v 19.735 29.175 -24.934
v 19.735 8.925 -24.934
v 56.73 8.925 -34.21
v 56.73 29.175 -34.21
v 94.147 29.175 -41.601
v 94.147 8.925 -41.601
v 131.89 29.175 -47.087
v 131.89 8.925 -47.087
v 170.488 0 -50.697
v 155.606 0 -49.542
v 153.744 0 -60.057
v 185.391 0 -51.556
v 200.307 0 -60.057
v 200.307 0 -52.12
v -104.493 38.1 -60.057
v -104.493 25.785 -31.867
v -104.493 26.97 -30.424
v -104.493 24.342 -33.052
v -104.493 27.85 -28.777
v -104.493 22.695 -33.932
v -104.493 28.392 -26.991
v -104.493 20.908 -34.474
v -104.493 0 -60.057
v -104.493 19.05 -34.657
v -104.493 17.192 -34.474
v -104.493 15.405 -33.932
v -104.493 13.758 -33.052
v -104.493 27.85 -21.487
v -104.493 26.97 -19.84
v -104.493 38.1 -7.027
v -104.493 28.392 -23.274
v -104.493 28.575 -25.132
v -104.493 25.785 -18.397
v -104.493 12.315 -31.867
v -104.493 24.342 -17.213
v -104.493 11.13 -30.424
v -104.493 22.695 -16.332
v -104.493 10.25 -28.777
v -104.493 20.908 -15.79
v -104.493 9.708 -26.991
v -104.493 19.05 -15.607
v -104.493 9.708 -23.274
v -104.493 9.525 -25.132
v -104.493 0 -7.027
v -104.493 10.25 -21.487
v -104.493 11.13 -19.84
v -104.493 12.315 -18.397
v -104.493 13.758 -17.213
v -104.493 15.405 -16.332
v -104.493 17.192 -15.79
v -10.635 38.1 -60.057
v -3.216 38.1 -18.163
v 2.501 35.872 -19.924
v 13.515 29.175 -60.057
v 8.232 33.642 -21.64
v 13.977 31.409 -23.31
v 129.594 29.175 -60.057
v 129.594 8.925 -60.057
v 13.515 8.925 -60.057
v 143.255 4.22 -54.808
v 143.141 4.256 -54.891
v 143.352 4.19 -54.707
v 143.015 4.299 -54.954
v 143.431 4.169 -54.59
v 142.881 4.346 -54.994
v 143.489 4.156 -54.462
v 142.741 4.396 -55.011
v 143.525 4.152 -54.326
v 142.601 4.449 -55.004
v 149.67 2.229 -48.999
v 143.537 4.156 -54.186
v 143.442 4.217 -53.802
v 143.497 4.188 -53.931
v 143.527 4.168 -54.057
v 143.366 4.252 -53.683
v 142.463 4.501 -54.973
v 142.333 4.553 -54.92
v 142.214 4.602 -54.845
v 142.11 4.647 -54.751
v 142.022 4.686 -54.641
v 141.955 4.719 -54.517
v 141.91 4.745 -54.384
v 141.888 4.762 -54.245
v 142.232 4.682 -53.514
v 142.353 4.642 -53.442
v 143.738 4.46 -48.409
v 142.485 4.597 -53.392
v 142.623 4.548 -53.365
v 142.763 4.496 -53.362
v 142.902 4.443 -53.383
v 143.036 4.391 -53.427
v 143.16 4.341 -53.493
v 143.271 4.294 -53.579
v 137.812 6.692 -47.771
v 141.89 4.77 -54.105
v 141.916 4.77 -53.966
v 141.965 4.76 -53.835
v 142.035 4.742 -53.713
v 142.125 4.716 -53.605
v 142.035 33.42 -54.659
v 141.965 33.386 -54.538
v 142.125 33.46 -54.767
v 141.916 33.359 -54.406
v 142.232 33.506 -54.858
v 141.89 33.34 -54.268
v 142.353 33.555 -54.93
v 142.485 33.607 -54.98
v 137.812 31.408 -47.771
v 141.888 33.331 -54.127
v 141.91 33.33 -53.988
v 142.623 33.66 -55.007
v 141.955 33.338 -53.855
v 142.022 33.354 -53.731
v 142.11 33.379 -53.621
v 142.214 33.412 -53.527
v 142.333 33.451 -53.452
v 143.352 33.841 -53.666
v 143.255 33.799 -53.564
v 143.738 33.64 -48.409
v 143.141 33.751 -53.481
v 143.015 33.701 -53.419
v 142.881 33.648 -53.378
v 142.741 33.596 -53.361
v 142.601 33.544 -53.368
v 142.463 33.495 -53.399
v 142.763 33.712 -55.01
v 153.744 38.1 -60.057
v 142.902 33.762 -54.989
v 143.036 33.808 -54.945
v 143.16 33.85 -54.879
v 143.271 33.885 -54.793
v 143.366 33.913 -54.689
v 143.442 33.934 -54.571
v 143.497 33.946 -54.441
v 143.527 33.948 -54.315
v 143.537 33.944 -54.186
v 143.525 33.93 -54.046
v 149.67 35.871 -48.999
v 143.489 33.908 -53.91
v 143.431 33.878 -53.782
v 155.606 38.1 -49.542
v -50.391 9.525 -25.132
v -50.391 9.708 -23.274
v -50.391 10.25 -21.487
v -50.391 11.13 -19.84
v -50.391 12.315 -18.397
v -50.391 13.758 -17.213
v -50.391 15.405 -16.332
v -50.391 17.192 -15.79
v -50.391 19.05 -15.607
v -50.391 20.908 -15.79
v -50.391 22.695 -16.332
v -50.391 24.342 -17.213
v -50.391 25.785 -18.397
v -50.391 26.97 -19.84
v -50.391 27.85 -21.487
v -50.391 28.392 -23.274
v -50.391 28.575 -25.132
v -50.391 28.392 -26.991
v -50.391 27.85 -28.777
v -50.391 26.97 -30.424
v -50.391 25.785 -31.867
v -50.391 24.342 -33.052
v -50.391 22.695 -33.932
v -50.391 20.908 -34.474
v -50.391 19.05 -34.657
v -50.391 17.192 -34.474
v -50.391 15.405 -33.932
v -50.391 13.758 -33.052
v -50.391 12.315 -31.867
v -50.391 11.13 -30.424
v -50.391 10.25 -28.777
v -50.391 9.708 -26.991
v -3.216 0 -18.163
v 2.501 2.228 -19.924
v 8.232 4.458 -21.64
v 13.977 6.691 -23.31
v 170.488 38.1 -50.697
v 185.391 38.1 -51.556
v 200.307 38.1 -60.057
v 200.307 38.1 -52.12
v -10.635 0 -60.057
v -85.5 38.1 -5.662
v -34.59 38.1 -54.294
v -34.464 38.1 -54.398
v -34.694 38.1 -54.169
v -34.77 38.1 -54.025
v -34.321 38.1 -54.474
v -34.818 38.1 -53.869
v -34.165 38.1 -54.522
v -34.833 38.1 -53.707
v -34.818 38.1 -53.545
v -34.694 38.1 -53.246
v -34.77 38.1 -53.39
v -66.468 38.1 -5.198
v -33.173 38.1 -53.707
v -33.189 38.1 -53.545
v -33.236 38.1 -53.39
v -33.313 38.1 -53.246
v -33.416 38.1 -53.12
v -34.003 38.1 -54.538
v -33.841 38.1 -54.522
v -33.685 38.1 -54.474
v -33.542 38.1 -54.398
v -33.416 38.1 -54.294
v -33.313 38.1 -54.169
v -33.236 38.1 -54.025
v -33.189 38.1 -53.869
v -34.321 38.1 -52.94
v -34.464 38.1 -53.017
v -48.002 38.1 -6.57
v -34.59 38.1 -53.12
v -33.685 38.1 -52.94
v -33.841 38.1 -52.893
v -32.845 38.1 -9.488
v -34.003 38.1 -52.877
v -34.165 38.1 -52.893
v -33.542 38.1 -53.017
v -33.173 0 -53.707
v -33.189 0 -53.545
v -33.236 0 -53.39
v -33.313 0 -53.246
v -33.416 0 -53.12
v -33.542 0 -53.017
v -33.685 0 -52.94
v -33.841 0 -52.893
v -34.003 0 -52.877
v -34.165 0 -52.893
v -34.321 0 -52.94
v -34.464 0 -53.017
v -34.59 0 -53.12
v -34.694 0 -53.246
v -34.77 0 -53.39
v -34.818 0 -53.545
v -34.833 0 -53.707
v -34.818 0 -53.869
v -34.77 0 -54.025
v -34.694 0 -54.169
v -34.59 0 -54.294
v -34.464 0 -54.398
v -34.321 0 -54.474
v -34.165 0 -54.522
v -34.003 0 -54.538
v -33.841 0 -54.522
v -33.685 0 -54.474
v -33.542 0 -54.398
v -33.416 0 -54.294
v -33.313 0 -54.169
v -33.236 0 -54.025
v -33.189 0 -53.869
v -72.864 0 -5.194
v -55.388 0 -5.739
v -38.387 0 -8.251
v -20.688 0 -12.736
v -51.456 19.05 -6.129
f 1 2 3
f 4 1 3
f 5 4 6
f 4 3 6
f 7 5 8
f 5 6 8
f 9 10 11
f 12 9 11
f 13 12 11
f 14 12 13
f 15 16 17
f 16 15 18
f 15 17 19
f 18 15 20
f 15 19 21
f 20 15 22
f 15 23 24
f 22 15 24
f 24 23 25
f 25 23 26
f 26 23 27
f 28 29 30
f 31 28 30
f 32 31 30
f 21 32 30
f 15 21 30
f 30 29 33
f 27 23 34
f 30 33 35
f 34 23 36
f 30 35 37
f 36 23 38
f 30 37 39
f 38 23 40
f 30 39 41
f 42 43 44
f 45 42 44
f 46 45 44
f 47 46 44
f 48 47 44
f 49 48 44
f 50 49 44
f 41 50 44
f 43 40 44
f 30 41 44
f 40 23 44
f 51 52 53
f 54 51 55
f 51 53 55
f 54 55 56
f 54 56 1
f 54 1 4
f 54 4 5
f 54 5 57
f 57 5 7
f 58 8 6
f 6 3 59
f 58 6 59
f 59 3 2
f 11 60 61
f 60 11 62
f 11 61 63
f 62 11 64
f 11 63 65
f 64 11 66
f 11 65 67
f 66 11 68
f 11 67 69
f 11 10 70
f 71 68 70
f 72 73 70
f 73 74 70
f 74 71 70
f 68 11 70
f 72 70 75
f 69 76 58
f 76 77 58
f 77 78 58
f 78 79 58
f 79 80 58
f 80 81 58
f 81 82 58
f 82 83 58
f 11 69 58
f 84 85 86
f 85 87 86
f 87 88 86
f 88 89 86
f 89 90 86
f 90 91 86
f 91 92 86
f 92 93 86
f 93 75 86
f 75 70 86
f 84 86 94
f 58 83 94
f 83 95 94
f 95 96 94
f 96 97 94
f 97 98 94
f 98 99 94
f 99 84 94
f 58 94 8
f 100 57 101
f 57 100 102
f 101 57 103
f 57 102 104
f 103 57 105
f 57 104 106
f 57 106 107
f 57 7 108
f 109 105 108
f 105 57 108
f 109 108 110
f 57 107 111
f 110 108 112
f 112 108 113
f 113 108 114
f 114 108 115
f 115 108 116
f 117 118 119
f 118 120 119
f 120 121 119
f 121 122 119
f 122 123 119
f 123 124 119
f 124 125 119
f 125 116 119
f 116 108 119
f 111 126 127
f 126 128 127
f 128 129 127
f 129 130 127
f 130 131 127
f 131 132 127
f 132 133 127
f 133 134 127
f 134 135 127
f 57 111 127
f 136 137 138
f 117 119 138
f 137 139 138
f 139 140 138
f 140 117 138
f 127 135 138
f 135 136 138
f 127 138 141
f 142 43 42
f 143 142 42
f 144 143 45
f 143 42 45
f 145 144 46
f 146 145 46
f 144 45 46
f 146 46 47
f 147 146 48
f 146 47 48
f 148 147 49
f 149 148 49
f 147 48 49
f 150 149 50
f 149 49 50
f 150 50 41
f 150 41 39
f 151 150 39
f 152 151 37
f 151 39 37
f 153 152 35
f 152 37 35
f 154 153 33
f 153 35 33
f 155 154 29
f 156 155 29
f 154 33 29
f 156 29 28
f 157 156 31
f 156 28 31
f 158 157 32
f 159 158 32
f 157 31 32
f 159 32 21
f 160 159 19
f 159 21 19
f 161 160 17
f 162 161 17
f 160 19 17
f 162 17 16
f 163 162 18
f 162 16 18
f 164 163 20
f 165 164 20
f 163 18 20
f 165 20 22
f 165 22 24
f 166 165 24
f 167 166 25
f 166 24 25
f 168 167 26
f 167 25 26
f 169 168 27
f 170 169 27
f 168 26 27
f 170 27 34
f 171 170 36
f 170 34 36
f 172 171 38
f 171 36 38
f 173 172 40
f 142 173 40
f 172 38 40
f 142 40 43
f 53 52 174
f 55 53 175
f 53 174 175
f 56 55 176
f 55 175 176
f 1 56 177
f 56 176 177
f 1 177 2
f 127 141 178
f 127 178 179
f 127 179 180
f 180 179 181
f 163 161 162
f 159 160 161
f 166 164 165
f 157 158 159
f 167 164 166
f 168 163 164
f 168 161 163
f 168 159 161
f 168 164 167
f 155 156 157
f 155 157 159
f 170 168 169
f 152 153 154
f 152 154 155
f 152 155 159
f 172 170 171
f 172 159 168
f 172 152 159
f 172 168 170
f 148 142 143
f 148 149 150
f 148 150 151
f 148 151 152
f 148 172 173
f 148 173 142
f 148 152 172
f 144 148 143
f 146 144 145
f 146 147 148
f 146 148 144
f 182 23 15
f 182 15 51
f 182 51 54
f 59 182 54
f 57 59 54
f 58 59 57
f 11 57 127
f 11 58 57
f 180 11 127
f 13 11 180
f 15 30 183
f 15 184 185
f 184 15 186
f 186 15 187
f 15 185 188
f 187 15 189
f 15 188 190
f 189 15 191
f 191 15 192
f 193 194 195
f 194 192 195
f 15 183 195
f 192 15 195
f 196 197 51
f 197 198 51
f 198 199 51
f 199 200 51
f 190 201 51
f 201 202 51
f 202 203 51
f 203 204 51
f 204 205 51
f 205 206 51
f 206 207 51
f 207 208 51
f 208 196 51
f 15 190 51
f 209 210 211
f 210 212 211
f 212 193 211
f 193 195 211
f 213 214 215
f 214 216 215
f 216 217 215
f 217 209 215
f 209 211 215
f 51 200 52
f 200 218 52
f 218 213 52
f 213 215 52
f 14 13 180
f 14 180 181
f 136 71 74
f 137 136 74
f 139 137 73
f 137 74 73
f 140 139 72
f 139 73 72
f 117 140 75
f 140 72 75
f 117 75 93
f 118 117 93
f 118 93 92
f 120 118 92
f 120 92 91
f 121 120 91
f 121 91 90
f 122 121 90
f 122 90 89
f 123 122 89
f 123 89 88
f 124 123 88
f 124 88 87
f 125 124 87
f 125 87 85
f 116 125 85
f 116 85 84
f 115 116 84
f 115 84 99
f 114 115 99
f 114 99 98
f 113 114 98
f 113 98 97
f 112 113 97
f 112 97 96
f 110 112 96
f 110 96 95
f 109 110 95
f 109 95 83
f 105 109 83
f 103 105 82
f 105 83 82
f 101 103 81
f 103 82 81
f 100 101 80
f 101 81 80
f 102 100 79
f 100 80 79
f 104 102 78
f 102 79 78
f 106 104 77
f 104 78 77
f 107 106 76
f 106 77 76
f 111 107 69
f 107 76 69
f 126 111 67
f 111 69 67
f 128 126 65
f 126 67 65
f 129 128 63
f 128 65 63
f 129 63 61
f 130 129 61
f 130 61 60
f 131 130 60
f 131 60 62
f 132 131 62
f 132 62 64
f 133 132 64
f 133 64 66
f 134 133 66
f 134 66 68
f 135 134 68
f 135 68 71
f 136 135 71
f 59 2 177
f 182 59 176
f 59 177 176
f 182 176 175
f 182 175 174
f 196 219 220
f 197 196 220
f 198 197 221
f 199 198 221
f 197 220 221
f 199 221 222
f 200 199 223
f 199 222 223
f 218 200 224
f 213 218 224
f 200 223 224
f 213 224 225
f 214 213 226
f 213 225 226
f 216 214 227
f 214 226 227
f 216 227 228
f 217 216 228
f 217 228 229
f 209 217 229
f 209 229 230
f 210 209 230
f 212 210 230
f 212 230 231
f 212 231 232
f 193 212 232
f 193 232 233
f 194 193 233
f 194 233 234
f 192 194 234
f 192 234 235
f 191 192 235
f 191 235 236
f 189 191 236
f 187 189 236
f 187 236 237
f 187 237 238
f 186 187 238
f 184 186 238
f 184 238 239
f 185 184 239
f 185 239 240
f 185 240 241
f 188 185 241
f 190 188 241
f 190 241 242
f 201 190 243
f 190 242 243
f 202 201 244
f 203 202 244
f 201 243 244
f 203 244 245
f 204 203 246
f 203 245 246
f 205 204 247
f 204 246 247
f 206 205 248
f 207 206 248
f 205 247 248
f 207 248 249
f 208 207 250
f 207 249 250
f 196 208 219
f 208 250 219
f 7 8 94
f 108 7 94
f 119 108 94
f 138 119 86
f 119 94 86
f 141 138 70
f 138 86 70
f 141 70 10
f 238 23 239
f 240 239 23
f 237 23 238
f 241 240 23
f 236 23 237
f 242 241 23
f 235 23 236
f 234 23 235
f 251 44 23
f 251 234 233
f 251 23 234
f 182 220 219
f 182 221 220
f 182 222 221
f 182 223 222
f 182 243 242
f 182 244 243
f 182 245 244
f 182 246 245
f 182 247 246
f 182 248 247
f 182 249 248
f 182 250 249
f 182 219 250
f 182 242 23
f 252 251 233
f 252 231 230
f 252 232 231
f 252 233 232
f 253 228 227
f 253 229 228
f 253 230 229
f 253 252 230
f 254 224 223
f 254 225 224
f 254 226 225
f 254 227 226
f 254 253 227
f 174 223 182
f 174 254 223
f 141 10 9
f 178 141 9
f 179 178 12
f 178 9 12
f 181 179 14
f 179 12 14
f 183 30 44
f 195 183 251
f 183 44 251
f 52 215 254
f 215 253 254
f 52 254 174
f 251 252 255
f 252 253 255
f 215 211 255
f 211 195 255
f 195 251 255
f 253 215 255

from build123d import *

# Parameters (mm, degrees)
F0_W      = 304.8
F0_H      = 69.85
F1_DEPTH  = 38.1
F3_DEPTH  = 50.8
F4_R      = 9.525
F5_DEPTH  = 54.102
F7_DEPTH  = 127
F10_DEPTH = 76.2
F11_R     = 0.8255
F12_DEPTH = 76.2
F13_R     = 0.8303429156
F14_DEPTH = 76.2


with BuildPart() as f1:
    # F0 (on Front) → F1 (new body)
    with BuildSketch(Plane.XZ):
        with Locations((47.9073338211, -25.1322889625)):
            Rectangle(F0_W, F0_H)
    extrude(amount=-F1_DEPTH)

    # F2 (on face) → F3 (cut)
    with BuildSketch(Plane.XZ):
        Polygon((200.3073338211, 9.7927110375), (-104.4926661789, 9.7927110375), (200.3073338211, -44.1822889625), align=None)
    extrude(amount=-F3_DEPTH, mode=Mode.SUBTRACT)

    # F4 (on face) → F5 (cut)
    with BuildSketch(Plane(origin=(-104.4926661789, 0, 0), x_dir=(0, -1, 0), z_dir=(-1, 0, 0))):
        with Locations((-19.05, -25.1322889625)):
            Circle(F4_R)
    extrude(amount=-F5_DEPTH, mode=Mode.SUBTRACT)

    # F6 (on face) → F7 (cut)
    with BuildSketch(Plane(origin=(-1.4957050092, 0, -8.4463341696), x_dir=(0.9846801257, 0, -0.1743704389), z_dir=(0.1743704389, 0, 0.9846801257))):
        Polygon((161.8607493793, 38.1), (0, 38.1), (23.7803746896, 29.1751033832), (138.0803746896, 29.1751033832), align=None)
        Polygon((23.7803746896, 8.9248966168), (0, 0), (161.8607493793, 0), (138.0803746896, 8.9248966168), align=None)
    extrude(amount=-F7_DEPTH, mode=Mode.SUBTRACT)

    # F8 (on face) + F9 (on Front) → F10 (cut)
    with BuildSketch(Plane.XZ):
        with BuildLine():
            Line((-104.4926661789, 9.7927110375), (-104.4926661789, -7.0267124102))
            add(Edge.make_bspline(
                [(-104.4926661789, -7.0267124102), (-86.5421169112, -5.598796544), (-51.2128417473, -2.7884517576), (-19.0416161066, -13.0937231046), (-3.2163576046, -18.1629605909)],
                knots=[0, 0, 0, 0, 0.5080927696, 1, 1, 1, 1], degree=3))
            Line((-3.2163576046, -18.1629605909), (-1.4957050092, -8.4463341696))
            Line((-1.4957050092, -8.4463341696), (-104.4926661789, 9.7927110375))
        make_face()
    with BuildSketch(Plane.XZ):
        with BuildLine():
            ThreePointArc((-3.2163576046, -18.1629605909), (8.2323547856, -21.6399019905), (19.734878598, -24.9344555011))
            Line((19.734878598, -24.9344555011), (21.9203573303, -12.5929285423))
            Line((21.9203573303, -12.5929285423), (-1.4957050092, -8.4463341696))
            Line((-1.4957050092, -8.4463341696), (-3.2163576046, -18.1629605909))
        make_face()
        with BuildLine():
            Line((157.8853580419, -36.6700640849), (155.6058786995, -49.5424180184))
            ThreePointArc((155.6058786995, -49.5424180184), (177.93744088, -51.1635043768), (200.3073338211, -52.1197889625))
            Line((200.3073338211, -52.1197889625), (200.3073338211, -44.1822889625))
            Line((200.3073338211, -44.1822889625), (157.8853580419, -36.6700640849))
        make_face()
        with BuildLine():
            Line((134.4692957023, -32.5234697123), (131.8903467665, -47.086946056))
            ThreePointArc((131.8903467665, -47.086946056), (143.7383916941, -48.4085701416), (155.6058786995, -49.5424180184))
            Line((155.6058786995, -49.5424180184), (157.8853580419, -36.6700640849))
            Line((157.8853580419, -36.6700640849), (134.4692957023, -32.5234697123))
        make_face()
        with BuildLine():
            Line((21.9203573303, -12.5929285423), (19.734878598, -24.9344555011))
            ThreePointArc((19.734878598, -24.9344555011), (75.3915150532, -38.1426688122), (131.8903467665, -47.086946056))
            Line((131.8903467665, -47.086946056), (134.4692957023, -32.5234697123))
            Line((134.4692957023, -32.5234697123), (21.9203573303, -12.5929285423))
        make_face()
    extrude(amount=-F10_DEPTH, mode=Mode.SUBTRACT)

    # F11 (on Front) → F12 (cut)
    with BuildSketch(Plane.XZ):
        with Locations((142.7114277425, -54.1861406792)):
            Circle(F11_R)
    extrude(amount=-F12_DEPTH, mode=Mode.SUBTRACT)

    # F13 (on Front) → F14 (cut)
    with BuildSketch(Plane.XZ):
        with Locations((-34.0031449204, -53.7072889625)):
            Circle(F13_R)
    extrude(amount=-F14_DEPTH, mode=Mode.SUBTRACT)


solid = f1.part
